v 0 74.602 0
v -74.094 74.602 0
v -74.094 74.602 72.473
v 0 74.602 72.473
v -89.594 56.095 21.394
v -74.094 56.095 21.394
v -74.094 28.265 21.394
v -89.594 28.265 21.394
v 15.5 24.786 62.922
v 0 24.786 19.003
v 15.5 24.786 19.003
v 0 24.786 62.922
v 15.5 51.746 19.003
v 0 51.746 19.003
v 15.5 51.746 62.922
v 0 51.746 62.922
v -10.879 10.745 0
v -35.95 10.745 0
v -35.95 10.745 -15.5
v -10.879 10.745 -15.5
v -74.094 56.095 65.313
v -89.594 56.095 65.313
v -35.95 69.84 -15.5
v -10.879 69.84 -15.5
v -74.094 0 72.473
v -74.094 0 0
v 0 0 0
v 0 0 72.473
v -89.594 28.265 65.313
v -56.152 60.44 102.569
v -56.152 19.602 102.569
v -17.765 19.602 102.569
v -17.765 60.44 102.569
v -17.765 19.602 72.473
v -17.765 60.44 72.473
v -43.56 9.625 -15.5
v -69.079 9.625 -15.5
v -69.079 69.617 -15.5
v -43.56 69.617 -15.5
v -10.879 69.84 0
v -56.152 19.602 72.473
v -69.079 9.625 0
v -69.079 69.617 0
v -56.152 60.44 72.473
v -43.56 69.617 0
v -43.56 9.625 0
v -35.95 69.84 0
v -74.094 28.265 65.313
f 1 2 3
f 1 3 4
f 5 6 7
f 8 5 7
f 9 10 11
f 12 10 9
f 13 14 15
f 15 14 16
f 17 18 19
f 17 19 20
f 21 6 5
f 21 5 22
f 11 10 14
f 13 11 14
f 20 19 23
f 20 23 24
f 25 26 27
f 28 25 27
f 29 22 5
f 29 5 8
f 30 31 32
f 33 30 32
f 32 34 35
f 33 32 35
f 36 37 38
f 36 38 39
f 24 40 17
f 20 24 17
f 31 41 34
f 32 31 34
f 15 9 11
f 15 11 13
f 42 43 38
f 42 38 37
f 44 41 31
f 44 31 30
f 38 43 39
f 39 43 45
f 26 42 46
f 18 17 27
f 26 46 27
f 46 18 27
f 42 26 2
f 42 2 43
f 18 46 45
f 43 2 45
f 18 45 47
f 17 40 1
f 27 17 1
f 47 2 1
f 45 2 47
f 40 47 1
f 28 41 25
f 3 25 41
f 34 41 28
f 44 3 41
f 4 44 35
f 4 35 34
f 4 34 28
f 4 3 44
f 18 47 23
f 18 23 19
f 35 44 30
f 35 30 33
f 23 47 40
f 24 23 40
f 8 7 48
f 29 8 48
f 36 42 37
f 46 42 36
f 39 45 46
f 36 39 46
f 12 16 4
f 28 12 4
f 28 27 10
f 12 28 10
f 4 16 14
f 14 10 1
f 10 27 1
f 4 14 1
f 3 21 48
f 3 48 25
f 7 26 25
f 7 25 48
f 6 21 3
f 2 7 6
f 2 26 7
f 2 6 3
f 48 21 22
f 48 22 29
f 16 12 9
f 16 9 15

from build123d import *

# Parameters (mm, degrees)
F0_W      = 74.0942507982
F0_H      = 74.6015533805
F1_DEPTH  = 72.4732205272
F2_W      = 38.3877456188
F2_H      = 40.8380180597
F3_DEPTH  = 30.0961155444
F4_W      = 26.9601941109
F4_H      = 43.9190119505
F5_DEPTH  = 15.5
F6_W      = 27.8298556805
F6_H      = 43.9190119505
F7_DEPTH  = 15.5
F8_W      = 25.5186259747
F8_H      = 59.9911510944
F9_DEPTH  = 15.5
F10_W     = 25.0709354877
F10_H     = 59.0957701206
F11_DEPTH = 15.5


with BuildPart() as f1:
    # F0 (on Top) → F1 (new body)
    with BuildSketch(Plane.XY):
        with Locations((-37.0471253991, 37.3007766902)):
            Rectangle(F0_W, F0_H)
    extrude(amount=F1_DEPTH)

    # F2 (on face) → F3 (join)
    with BuildSketch(Plane.XY.offset(72.4732205272)):
        with Locations((-36.9584262371, 40.0212556124)):
            Rectangle(F2_W, F2_H)
    extrude(amount=F3_DEPTH)

    # F4 (on face) → F5 (join)
    with BuildSketch(Plane.YZ):
        with Locations((38.2660329342, 40.9622490406)):
            Rectangle(F4_W, F4_H)
    extrude(amount=F5_DEPTH)

    # F6 (on face) → F7 (join)
    with BuildSketch(Plane(origin=(-74.0942507982, 0, 0), x_dir=(0, -1, 0), z_dir=(-1, 0, 0))):
        with Locations((-42.1796441078, 43.3538928628)):
            Rectangle(F6_W, F6_H)
    extrude(amount=F7_DEPTH)

    # F8 (on face) → F9 (join)
    with BuildSketch(Plane(origin=(0, 0, 0), x_dir=(1, 0, 0), z_dir=(0, 0, -1))):
        with Locations((-56.3197880983, -39.6210104227)):
            Rectangle(F8_W, F8_H)
    extrude(amount=F9_DEPTH)

    # F10 (on face) → F11 (join)
    with BuildSketch(Plane(origin=(0, 0, 0), x_dir=(1, 0, 0), z_dir=(0, 0, -1))):
        with Locations((-23.4141945839, -40.2925610542)):
            Rectangle(F10_W, F10_H)
    extrude(amount=F11_DEPTH)


solid = f1.part
